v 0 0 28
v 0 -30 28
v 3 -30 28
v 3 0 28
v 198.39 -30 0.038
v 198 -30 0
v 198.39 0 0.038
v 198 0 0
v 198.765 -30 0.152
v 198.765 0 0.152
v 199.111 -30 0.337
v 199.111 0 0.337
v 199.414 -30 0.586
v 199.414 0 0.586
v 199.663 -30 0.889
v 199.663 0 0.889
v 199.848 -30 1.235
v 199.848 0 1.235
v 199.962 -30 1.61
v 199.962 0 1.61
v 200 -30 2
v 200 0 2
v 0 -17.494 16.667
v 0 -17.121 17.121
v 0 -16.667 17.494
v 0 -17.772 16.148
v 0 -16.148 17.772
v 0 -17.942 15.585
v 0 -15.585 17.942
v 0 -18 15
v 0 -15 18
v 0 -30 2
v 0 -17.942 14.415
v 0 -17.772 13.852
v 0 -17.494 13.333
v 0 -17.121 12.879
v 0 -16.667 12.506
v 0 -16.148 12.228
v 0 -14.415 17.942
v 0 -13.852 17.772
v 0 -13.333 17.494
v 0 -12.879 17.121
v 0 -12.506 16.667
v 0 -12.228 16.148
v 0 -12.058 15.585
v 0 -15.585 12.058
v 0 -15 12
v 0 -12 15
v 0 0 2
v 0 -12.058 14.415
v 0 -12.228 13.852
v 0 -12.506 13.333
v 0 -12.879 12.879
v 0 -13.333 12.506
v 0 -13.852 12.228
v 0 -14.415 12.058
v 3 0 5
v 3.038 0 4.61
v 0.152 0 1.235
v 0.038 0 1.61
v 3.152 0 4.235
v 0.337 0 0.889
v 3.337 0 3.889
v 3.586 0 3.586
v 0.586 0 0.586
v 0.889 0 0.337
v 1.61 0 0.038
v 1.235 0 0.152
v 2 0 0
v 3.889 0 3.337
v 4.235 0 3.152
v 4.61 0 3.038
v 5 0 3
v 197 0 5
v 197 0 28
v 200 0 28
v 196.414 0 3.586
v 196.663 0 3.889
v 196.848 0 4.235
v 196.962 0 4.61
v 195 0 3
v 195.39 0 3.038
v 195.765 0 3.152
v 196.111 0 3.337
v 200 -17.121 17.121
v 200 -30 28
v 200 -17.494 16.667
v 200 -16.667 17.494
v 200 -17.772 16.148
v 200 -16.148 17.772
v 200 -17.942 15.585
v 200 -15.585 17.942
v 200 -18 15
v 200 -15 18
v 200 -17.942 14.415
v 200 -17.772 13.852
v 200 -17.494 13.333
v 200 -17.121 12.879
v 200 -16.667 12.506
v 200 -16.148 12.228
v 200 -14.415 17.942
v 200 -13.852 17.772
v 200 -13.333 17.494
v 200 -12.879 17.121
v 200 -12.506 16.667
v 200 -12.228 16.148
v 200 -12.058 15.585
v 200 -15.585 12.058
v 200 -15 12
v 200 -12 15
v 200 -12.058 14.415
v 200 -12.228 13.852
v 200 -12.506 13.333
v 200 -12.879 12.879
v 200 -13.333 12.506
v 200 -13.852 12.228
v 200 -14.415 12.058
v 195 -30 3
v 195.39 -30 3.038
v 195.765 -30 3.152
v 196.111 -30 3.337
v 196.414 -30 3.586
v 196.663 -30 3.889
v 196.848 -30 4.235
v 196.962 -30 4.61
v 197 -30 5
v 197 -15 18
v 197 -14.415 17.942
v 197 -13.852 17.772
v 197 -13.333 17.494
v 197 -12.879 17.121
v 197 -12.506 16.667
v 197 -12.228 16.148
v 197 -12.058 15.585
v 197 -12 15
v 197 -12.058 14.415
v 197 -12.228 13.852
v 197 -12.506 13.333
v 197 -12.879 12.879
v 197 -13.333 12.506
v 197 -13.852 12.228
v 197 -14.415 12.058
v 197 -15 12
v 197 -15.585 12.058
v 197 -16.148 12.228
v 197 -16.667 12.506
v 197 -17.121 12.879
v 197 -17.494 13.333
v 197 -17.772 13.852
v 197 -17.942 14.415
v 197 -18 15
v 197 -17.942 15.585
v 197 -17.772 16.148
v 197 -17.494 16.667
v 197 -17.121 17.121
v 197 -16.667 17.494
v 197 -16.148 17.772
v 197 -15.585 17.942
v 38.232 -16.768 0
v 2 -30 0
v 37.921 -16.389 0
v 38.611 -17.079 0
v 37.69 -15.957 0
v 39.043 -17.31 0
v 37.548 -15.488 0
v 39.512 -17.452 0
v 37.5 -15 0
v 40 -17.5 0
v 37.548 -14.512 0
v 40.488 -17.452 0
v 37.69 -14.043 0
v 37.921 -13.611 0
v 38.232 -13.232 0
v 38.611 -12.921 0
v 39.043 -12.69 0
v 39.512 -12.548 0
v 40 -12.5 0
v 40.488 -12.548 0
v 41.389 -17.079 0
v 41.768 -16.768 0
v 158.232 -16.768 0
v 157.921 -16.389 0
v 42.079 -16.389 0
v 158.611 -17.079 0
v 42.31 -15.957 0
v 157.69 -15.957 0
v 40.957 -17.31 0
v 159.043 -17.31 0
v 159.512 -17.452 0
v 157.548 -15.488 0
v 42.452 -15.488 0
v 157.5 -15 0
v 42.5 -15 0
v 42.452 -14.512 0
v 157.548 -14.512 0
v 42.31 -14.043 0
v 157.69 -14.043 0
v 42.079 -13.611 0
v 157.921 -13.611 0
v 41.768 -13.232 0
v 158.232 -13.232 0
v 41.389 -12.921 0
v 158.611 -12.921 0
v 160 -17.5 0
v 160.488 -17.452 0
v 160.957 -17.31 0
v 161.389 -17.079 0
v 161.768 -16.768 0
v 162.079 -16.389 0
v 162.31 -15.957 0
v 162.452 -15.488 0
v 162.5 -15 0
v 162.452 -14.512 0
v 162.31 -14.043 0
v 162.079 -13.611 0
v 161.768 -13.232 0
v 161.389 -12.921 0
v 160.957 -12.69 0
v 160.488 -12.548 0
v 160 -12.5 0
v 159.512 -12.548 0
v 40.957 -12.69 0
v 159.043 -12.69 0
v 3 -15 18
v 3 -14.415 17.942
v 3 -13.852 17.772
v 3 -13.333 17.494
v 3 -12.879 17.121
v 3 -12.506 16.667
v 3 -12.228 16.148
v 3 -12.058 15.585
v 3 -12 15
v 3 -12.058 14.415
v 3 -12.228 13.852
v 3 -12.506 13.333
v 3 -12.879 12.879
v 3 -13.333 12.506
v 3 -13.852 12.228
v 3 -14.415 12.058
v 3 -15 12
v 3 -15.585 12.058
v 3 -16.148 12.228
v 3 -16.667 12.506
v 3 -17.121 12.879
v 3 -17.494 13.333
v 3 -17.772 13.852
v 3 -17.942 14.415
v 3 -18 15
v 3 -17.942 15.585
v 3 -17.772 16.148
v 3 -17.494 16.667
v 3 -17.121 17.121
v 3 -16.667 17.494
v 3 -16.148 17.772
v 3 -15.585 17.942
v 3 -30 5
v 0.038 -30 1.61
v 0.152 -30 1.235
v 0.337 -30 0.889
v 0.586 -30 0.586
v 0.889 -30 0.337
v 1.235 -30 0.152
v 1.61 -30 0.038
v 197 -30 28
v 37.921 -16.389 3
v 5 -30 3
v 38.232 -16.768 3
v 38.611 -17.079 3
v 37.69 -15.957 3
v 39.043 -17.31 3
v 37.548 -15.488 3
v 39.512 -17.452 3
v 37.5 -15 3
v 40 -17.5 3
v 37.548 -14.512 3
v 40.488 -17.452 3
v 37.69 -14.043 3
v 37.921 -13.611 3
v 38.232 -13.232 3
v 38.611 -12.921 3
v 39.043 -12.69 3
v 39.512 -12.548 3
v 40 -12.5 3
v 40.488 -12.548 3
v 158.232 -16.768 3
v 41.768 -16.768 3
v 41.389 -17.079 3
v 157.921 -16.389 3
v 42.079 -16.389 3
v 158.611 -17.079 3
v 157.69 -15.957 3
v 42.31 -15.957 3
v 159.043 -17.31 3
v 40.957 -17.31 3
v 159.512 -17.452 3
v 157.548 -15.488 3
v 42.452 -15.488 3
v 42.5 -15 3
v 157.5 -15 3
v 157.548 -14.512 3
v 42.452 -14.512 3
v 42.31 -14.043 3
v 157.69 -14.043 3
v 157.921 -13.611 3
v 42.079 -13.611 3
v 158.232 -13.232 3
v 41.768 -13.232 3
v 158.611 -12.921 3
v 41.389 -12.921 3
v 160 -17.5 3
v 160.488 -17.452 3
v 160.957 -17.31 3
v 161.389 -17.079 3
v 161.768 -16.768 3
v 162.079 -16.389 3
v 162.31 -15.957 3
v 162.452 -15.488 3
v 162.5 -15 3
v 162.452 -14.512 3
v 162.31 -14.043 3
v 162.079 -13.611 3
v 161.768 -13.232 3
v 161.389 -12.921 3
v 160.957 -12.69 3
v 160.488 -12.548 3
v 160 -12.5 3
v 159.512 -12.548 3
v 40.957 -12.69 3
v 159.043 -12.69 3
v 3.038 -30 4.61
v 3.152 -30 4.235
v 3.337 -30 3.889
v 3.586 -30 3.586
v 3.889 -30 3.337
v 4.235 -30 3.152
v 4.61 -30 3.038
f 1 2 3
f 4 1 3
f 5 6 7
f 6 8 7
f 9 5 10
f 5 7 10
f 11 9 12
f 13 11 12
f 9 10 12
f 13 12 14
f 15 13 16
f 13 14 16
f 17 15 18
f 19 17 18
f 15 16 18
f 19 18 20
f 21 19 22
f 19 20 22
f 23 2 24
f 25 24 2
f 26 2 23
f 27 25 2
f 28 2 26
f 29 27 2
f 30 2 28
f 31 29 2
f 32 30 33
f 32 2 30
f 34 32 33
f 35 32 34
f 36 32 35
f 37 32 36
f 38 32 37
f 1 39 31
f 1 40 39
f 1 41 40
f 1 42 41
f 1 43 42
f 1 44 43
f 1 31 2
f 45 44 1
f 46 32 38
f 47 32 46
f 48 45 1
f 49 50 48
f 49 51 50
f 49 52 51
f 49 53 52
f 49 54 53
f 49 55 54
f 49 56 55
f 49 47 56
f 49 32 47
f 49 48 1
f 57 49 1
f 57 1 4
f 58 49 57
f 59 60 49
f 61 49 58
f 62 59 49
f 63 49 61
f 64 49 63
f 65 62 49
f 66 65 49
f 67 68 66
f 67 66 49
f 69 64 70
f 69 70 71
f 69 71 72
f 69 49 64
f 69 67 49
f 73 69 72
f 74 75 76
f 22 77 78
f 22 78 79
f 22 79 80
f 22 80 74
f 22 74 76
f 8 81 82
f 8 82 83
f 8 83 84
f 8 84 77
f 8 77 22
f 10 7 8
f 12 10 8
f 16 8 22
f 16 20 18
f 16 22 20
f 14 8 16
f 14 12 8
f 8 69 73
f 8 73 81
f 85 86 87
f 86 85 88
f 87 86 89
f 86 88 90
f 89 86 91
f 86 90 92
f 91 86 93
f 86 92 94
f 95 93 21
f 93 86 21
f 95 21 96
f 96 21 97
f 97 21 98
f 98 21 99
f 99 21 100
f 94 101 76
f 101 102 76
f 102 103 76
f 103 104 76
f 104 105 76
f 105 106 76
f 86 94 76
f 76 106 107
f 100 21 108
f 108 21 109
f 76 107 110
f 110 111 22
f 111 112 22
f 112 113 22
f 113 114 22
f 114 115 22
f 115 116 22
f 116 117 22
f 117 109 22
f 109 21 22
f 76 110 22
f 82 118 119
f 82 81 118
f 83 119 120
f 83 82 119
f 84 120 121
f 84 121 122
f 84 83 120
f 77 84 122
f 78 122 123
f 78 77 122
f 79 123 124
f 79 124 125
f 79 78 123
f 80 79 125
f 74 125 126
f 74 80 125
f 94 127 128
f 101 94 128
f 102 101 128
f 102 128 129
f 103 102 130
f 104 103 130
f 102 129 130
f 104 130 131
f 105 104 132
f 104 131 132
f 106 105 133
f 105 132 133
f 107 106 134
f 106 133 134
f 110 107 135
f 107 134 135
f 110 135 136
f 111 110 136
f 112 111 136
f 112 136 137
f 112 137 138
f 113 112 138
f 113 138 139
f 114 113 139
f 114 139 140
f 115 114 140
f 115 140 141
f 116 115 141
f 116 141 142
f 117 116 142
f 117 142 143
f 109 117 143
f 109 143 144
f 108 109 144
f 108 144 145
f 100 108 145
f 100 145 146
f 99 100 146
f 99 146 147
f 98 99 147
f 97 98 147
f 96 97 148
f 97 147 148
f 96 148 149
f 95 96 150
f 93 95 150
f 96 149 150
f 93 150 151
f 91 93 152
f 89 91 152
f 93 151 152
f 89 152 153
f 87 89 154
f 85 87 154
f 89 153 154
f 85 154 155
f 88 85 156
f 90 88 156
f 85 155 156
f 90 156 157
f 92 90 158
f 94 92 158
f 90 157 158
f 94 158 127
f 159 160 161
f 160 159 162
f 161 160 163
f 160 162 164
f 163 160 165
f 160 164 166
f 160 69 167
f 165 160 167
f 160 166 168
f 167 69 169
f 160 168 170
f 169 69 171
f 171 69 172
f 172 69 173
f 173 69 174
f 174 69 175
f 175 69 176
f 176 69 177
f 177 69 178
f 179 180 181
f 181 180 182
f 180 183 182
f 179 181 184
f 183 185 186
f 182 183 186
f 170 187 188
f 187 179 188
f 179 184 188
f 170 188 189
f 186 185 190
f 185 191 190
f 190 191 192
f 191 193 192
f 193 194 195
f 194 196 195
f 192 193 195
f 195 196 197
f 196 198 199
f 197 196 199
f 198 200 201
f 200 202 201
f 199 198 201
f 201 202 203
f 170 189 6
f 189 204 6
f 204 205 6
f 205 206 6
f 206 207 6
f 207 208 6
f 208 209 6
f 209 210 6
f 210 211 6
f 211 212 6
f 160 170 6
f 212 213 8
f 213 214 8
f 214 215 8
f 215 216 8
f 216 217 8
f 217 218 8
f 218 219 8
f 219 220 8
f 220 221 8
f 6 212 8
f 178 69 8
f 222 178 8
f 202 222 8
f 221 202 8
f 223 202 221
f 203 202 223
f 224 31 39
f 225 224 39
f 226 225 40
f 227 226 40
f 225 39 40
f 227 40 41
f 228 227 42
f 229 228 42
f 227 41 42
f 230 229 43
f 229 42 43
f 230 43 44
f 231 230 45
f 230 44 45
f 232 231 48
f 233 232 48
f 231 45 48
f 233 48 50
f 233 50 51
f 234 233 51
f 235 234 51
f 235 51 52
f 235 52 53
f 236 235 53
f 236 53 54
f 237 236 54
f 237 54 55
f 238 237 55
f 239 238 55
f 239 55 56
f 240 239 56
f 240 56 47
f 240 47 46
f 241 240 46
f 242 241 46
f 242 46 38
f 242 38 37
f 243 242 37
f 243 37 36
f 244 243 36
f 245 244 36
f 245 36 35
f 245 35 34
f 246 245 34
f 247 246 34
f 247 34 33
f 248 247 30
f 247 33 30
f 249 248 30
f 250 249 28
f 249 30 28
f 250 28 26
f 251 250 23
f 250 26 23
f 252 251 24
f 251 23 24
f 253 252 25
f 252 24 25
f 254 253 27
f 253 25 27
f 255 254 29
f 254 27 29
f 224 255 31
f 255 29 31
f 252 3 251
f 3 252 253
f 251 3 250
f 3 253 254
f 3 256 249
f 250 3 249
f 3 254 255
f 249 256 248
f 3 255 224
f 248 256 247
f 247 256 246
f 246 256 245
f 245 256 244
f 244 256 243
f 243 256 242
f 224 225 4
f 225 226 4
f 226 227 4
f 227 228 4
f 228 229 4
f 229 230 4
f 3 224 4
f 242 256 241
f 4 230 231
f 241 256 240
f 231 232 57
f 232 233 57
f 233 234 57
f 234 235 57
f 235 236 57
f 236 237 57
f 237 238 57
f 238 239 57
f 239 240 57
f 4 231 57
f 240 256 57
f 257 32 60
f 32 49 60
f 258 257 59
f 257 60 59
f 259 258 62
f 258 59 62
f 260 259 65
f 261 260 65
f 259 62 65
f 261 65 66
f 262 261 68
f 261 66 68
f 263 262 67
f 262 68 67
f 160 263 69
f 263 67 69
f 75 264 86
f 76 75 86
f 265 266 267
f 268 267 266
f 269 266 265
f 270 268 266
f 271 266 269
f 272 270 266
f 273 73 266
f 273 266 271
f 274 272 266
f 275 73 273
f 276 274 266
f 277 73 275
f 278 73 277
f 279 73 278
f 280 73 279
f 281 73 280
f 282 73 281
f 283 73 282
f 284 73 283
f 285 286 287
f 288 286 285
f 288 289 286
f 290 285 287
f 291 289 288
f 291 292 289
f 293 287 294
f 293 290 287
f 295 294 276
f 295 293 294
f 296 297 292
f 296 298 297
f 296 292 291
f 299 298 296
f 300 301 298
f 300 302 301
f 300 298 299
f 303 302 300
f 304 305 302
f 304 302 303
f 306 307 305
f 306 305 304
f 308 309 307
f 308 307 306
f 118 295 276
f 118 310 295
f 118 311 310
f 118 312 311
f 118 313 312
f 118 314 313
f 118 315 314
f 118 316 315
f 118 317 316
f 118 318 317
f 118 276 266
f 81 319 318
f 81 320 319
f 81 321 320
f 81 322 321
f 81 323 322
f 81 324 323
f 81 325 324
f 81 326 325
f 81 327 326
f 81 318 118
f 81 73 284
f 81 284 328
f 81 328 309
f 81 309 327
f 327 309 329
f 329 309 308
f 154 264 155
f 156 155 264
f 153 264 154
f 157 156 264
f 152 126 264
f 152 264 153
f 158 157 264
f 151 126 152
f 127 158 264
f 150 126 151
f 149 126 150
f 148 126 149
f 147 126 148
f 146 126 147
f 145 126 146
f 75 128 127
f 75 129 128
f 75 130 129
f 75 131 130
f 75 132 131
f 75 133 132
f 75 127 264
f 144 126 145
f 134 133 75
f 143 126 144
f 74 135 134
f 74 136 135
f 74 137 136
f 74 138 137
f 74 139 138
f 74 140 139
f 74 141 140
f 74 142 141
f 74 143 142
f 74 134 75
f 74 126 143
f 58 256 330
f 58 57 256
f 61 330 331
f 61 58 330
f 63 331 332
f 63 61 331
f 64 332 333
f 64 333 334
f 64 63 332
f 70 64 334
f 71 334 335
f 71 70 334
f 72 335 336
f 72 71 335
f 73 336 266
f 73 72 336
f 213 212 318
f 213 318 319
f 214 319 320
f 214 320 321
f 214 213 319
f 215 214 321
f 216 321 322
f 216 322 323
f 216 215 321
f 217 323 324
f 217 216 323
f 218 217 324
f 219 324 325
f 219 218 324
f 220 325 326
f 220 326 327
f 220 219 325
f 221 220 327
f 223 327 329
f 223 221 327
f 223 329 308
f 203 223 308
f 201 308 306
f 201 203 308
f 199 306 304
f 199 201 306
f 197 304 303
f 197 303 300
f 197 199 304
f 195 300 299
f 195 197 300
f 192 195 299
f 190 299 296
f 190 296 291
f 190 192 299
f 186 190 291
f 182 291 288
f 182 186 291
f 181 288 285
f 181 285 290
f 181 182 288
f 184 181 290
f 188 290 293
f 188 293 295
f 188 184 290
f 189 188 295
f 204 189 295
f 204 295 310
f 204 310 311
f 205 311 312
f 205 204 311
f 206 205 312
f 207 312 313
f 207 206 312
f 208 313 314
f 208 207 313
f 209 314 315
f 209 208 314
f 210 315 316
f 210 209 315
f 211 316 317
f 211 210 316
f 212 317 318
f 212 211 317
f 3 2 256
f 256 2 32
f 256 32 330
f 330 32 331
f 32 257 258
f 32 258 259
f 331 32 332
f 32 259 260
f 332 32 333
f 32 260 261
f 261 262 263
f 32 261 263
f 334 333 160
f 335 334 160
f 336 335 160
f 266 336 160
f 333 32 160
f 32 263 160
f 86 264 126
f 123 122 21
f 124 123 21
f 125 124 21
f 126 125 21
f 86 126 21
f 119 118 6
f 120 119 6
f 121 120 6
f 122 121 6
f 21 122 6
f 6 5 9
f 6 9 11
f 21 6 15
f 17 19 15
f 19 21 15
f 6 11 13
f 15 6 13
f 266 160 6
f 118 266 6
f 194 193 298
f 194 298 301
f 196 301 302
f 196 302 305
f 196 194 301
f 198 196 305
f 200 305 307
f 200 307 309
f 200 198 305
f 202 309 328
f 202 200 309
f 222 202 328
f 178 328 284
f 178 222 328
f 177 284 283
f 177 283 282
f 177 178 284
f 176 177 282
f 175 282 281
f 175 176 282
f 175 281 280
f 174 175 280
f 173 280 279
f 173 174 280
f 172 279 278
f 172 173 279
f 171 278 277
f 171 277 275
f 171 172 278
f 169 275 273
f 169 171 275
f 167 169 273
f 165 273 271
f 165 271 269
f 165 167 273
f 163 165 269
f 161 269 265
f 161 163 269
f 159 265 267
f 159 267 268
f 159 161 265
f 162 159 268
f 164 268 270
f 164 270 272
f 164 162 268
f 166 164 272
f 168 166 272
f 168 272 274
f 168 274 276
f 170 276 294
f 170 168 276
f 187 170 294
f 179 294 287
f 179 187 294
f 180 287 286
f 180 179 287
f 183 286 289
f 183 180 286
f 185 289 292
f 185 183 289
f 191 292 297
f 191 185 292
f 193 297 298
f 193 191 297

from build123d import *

# Parameters (mm, degrees)
ESQUISSE1_W             = 200
ESQUISSE1_H             = 30
ESQUISSE1_R             = 2.5
BOSS_EXTRU_1_DEPTH      = 3
ESQUISSE2_W             = 3
ESQUISSE2_H             = 30
BOSS_EXTRU_2_DEPTH      = 25
ESQUISSE3_R             = 3
ENL_V_MAT_EXTRU_1_DEPTH = 229
CONG_1_R                = 2


with BuildPart() as part:
    # Esquisse1 → Boss.-Extru.1 (new body)
    with BuildSketch(Plane.XY):
        with Locations((100, -15)):
            Rectangle(ESQUISSE1_W, ESQUISSE1_H)
        with Locations((40, -15)):
            Circle(ESQUISSE1_R, mode=Mode.SUBTRACT)
        with Locations((160, -15)):
            Circle(ESQUISSE1_R, mode=Mode.SUBTRACT)
    extrude(amount=BOSS_EXTRU_1_DEPTH)

    # Esquisse2 → Boss.-Extru.2 (add)
    with BuildSketch(Plane.XY.offset(3)):
        with Locations((1.5, -15)):
            Rectangle(ESQUISSE2_W, ESQUISSE2_H)
        with Locations((198.5, -15)):
            Rectangle(ESQUISSE2_W, ESQUISSE2_H)
    extrude(amount=BOSS_EXTRU_2_DEPTH)

    # Esquisse3 → Enlèv. mat.-Extru.1 (cut)
    with BuildSketch(Plane.ZY):
        with Locations((15, -15)):
            Circle(ESQUISSE3_R)
    extrude(amount=-ENL_V_MAT_EXTRU_1_DEPTH, mode=Mode.SUBTRACT)

    # Congé1
    cong_1_edges = [part.edges().sort_by_distance(p)[0] for p in [
        (3, -15, 3),
        (197, -15, 3),
        (200, -15, 0),
        (0, -15, 0),
    ]]
    fillet(cong_1_edges, radius=CONG_1_R)


solid = part.part
